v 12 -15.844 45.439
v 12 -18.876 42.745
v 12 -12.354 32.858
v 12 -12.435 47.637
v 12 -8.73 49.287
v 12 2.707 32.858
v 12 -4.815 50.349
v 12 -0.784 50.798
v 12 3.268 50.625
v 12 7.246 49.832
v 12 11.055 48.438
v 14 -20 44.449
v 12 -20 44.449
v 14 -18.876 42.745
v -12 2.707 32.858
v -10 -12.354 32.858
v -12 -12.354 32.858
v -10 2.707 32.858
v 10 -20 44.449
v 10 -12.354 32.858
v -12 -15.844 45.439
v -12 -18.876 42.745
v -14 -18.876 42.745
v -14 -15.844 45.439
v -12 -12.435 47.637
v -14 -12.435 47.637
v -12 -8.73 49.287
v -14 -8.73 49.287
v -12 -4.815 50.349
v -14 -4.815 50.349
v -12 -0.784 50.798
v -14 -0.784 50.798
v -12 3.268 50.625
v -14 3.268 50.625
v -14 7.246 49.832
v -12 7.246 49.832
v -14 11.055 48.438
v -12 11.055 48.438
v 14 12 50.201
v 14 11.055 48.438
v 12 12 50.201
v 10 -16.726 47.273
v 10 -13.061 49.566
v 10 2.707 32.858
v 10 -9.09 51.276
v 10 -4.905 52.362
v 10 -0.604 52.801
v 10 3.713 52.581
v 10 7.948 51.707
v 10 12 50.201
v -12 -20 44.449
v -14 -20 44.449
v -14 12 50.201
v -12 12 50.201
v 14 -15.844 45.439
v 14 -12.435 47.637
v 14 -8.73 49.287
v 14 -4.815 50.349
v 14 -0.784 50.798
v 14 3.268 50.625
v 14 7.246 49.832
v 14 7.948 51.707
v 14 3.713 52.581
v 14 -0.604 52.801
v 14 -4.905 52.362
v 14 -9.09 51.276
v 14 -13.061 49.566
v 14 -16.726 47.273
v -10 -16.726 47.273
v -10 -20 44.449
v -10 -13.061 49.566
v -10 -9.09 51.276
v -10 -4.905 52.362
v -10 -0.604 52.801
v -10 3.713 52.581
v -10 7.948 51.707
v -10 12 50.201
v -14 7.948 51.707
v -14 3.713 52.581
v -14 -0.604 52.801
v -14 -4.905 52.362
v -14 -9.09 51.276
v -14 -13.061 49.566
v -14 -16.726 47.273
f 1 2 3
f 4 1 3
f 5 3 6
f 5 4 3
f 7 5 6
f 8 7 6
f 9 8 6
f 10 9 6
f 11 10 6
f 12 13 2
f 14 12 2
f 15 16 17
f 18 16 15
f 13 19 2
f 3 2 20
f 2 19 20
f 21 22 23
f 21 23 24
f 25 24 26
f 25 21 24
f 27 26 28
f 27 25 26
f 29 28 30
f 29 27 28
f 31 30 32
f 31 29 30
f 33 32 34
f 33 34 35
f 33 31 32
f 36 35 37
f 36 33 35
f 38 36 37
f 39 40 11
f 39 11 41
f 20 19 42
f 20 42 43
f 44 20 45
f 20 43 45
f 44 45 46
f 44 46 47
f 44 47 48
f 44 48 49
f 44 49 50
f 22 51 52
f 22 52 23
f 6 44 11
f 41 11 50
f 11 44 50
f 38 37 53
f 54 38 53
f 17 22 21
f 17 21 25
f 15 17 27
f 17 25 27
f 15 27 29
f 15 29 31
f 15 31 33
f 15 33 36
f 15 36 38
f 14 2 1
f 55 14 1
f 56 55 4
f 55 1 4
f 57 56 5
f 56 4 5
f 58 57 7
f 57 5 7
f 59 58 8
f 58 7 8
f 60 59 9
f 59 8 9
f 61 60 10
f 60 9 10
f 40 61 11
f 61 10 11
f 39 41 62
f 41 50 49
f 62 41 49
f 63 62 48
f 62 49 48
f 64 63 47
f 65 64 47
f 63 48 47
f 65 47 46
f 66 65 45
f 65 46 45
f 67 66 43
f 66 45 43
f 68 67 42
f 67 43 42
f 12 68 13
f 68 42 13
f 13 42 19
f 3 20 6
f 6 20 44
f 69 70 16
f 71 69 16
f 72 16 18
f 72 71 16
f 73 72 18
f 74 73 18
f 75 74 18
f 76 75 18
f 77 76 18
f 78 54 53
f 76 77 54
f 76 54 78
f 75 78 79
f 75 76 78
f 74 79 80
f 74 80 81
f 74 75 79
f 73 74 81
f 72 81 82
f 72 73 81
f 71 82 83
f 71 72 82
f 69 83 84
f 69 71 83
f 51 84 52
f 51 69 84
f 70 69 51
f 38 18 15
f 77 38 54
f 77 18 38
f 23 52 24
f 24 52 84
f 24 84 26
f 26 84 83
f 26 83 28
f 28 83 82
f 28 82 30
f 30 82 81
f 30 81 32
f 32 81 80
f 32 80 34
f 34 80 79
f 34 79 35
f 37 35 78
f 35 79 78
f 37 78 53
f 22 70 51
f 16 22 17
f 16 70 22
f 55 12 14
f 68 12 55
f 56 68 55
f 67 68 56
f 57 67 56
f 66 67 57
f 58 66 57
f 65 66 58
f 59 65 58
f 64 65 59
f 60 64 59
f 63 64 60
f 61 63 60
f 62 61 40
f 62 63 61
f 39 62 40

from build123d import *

# Parameters (mm, degrees)
PAD_DEPTH    = 2
PAD002_DEPTH = 2


with BuildPart() as part:
    # Sketch002 (on DatumPlane) → Pad (new body)
    with BuildSketch(Plane.YZ.offset(10)):
        with BuildLine():
            Line((-20, 44.449222), (-12.353723, 32.857666))
            Line((-12.353723, 32.857666), (2.706952, 32.857666))
            Line((2.706952, 32.857666), (12, 50.200987))
            ThreePointArc((12, 50.200987), (-4.905416, 52.362393), (-20, 44.449222))
        make_face()
    pad = extrude(amount=PAD_DEPTH)

    # Sketch009 (on Face6 of Pad) → Pad002 (join)
    with BuildSketch(Plane.YZ.offset(12)):
        with BuildLine():
            ThreePointArc((12, 50.200987), (-4.905416, 52.362393), (-20, 44.449222))
            Line((-20, 44.449222), (-18.875562, 42.744603))
            ThreePointArc((-18.875562, 42.744603), (-4.815104, 50.349098), (11.055401, 48.438111))
            Line((11.055401, 48.438111), (12, 50.200987))
        make_face()
    pad002 = extrude(amount=PAD002_DEPTH)

    # Mirrored001: Pad, Pad002 across YZ
    add(pad.mirror(Plane.YZ))
    add(pad002.mirror(Plane.YZ))


solid = part.part
